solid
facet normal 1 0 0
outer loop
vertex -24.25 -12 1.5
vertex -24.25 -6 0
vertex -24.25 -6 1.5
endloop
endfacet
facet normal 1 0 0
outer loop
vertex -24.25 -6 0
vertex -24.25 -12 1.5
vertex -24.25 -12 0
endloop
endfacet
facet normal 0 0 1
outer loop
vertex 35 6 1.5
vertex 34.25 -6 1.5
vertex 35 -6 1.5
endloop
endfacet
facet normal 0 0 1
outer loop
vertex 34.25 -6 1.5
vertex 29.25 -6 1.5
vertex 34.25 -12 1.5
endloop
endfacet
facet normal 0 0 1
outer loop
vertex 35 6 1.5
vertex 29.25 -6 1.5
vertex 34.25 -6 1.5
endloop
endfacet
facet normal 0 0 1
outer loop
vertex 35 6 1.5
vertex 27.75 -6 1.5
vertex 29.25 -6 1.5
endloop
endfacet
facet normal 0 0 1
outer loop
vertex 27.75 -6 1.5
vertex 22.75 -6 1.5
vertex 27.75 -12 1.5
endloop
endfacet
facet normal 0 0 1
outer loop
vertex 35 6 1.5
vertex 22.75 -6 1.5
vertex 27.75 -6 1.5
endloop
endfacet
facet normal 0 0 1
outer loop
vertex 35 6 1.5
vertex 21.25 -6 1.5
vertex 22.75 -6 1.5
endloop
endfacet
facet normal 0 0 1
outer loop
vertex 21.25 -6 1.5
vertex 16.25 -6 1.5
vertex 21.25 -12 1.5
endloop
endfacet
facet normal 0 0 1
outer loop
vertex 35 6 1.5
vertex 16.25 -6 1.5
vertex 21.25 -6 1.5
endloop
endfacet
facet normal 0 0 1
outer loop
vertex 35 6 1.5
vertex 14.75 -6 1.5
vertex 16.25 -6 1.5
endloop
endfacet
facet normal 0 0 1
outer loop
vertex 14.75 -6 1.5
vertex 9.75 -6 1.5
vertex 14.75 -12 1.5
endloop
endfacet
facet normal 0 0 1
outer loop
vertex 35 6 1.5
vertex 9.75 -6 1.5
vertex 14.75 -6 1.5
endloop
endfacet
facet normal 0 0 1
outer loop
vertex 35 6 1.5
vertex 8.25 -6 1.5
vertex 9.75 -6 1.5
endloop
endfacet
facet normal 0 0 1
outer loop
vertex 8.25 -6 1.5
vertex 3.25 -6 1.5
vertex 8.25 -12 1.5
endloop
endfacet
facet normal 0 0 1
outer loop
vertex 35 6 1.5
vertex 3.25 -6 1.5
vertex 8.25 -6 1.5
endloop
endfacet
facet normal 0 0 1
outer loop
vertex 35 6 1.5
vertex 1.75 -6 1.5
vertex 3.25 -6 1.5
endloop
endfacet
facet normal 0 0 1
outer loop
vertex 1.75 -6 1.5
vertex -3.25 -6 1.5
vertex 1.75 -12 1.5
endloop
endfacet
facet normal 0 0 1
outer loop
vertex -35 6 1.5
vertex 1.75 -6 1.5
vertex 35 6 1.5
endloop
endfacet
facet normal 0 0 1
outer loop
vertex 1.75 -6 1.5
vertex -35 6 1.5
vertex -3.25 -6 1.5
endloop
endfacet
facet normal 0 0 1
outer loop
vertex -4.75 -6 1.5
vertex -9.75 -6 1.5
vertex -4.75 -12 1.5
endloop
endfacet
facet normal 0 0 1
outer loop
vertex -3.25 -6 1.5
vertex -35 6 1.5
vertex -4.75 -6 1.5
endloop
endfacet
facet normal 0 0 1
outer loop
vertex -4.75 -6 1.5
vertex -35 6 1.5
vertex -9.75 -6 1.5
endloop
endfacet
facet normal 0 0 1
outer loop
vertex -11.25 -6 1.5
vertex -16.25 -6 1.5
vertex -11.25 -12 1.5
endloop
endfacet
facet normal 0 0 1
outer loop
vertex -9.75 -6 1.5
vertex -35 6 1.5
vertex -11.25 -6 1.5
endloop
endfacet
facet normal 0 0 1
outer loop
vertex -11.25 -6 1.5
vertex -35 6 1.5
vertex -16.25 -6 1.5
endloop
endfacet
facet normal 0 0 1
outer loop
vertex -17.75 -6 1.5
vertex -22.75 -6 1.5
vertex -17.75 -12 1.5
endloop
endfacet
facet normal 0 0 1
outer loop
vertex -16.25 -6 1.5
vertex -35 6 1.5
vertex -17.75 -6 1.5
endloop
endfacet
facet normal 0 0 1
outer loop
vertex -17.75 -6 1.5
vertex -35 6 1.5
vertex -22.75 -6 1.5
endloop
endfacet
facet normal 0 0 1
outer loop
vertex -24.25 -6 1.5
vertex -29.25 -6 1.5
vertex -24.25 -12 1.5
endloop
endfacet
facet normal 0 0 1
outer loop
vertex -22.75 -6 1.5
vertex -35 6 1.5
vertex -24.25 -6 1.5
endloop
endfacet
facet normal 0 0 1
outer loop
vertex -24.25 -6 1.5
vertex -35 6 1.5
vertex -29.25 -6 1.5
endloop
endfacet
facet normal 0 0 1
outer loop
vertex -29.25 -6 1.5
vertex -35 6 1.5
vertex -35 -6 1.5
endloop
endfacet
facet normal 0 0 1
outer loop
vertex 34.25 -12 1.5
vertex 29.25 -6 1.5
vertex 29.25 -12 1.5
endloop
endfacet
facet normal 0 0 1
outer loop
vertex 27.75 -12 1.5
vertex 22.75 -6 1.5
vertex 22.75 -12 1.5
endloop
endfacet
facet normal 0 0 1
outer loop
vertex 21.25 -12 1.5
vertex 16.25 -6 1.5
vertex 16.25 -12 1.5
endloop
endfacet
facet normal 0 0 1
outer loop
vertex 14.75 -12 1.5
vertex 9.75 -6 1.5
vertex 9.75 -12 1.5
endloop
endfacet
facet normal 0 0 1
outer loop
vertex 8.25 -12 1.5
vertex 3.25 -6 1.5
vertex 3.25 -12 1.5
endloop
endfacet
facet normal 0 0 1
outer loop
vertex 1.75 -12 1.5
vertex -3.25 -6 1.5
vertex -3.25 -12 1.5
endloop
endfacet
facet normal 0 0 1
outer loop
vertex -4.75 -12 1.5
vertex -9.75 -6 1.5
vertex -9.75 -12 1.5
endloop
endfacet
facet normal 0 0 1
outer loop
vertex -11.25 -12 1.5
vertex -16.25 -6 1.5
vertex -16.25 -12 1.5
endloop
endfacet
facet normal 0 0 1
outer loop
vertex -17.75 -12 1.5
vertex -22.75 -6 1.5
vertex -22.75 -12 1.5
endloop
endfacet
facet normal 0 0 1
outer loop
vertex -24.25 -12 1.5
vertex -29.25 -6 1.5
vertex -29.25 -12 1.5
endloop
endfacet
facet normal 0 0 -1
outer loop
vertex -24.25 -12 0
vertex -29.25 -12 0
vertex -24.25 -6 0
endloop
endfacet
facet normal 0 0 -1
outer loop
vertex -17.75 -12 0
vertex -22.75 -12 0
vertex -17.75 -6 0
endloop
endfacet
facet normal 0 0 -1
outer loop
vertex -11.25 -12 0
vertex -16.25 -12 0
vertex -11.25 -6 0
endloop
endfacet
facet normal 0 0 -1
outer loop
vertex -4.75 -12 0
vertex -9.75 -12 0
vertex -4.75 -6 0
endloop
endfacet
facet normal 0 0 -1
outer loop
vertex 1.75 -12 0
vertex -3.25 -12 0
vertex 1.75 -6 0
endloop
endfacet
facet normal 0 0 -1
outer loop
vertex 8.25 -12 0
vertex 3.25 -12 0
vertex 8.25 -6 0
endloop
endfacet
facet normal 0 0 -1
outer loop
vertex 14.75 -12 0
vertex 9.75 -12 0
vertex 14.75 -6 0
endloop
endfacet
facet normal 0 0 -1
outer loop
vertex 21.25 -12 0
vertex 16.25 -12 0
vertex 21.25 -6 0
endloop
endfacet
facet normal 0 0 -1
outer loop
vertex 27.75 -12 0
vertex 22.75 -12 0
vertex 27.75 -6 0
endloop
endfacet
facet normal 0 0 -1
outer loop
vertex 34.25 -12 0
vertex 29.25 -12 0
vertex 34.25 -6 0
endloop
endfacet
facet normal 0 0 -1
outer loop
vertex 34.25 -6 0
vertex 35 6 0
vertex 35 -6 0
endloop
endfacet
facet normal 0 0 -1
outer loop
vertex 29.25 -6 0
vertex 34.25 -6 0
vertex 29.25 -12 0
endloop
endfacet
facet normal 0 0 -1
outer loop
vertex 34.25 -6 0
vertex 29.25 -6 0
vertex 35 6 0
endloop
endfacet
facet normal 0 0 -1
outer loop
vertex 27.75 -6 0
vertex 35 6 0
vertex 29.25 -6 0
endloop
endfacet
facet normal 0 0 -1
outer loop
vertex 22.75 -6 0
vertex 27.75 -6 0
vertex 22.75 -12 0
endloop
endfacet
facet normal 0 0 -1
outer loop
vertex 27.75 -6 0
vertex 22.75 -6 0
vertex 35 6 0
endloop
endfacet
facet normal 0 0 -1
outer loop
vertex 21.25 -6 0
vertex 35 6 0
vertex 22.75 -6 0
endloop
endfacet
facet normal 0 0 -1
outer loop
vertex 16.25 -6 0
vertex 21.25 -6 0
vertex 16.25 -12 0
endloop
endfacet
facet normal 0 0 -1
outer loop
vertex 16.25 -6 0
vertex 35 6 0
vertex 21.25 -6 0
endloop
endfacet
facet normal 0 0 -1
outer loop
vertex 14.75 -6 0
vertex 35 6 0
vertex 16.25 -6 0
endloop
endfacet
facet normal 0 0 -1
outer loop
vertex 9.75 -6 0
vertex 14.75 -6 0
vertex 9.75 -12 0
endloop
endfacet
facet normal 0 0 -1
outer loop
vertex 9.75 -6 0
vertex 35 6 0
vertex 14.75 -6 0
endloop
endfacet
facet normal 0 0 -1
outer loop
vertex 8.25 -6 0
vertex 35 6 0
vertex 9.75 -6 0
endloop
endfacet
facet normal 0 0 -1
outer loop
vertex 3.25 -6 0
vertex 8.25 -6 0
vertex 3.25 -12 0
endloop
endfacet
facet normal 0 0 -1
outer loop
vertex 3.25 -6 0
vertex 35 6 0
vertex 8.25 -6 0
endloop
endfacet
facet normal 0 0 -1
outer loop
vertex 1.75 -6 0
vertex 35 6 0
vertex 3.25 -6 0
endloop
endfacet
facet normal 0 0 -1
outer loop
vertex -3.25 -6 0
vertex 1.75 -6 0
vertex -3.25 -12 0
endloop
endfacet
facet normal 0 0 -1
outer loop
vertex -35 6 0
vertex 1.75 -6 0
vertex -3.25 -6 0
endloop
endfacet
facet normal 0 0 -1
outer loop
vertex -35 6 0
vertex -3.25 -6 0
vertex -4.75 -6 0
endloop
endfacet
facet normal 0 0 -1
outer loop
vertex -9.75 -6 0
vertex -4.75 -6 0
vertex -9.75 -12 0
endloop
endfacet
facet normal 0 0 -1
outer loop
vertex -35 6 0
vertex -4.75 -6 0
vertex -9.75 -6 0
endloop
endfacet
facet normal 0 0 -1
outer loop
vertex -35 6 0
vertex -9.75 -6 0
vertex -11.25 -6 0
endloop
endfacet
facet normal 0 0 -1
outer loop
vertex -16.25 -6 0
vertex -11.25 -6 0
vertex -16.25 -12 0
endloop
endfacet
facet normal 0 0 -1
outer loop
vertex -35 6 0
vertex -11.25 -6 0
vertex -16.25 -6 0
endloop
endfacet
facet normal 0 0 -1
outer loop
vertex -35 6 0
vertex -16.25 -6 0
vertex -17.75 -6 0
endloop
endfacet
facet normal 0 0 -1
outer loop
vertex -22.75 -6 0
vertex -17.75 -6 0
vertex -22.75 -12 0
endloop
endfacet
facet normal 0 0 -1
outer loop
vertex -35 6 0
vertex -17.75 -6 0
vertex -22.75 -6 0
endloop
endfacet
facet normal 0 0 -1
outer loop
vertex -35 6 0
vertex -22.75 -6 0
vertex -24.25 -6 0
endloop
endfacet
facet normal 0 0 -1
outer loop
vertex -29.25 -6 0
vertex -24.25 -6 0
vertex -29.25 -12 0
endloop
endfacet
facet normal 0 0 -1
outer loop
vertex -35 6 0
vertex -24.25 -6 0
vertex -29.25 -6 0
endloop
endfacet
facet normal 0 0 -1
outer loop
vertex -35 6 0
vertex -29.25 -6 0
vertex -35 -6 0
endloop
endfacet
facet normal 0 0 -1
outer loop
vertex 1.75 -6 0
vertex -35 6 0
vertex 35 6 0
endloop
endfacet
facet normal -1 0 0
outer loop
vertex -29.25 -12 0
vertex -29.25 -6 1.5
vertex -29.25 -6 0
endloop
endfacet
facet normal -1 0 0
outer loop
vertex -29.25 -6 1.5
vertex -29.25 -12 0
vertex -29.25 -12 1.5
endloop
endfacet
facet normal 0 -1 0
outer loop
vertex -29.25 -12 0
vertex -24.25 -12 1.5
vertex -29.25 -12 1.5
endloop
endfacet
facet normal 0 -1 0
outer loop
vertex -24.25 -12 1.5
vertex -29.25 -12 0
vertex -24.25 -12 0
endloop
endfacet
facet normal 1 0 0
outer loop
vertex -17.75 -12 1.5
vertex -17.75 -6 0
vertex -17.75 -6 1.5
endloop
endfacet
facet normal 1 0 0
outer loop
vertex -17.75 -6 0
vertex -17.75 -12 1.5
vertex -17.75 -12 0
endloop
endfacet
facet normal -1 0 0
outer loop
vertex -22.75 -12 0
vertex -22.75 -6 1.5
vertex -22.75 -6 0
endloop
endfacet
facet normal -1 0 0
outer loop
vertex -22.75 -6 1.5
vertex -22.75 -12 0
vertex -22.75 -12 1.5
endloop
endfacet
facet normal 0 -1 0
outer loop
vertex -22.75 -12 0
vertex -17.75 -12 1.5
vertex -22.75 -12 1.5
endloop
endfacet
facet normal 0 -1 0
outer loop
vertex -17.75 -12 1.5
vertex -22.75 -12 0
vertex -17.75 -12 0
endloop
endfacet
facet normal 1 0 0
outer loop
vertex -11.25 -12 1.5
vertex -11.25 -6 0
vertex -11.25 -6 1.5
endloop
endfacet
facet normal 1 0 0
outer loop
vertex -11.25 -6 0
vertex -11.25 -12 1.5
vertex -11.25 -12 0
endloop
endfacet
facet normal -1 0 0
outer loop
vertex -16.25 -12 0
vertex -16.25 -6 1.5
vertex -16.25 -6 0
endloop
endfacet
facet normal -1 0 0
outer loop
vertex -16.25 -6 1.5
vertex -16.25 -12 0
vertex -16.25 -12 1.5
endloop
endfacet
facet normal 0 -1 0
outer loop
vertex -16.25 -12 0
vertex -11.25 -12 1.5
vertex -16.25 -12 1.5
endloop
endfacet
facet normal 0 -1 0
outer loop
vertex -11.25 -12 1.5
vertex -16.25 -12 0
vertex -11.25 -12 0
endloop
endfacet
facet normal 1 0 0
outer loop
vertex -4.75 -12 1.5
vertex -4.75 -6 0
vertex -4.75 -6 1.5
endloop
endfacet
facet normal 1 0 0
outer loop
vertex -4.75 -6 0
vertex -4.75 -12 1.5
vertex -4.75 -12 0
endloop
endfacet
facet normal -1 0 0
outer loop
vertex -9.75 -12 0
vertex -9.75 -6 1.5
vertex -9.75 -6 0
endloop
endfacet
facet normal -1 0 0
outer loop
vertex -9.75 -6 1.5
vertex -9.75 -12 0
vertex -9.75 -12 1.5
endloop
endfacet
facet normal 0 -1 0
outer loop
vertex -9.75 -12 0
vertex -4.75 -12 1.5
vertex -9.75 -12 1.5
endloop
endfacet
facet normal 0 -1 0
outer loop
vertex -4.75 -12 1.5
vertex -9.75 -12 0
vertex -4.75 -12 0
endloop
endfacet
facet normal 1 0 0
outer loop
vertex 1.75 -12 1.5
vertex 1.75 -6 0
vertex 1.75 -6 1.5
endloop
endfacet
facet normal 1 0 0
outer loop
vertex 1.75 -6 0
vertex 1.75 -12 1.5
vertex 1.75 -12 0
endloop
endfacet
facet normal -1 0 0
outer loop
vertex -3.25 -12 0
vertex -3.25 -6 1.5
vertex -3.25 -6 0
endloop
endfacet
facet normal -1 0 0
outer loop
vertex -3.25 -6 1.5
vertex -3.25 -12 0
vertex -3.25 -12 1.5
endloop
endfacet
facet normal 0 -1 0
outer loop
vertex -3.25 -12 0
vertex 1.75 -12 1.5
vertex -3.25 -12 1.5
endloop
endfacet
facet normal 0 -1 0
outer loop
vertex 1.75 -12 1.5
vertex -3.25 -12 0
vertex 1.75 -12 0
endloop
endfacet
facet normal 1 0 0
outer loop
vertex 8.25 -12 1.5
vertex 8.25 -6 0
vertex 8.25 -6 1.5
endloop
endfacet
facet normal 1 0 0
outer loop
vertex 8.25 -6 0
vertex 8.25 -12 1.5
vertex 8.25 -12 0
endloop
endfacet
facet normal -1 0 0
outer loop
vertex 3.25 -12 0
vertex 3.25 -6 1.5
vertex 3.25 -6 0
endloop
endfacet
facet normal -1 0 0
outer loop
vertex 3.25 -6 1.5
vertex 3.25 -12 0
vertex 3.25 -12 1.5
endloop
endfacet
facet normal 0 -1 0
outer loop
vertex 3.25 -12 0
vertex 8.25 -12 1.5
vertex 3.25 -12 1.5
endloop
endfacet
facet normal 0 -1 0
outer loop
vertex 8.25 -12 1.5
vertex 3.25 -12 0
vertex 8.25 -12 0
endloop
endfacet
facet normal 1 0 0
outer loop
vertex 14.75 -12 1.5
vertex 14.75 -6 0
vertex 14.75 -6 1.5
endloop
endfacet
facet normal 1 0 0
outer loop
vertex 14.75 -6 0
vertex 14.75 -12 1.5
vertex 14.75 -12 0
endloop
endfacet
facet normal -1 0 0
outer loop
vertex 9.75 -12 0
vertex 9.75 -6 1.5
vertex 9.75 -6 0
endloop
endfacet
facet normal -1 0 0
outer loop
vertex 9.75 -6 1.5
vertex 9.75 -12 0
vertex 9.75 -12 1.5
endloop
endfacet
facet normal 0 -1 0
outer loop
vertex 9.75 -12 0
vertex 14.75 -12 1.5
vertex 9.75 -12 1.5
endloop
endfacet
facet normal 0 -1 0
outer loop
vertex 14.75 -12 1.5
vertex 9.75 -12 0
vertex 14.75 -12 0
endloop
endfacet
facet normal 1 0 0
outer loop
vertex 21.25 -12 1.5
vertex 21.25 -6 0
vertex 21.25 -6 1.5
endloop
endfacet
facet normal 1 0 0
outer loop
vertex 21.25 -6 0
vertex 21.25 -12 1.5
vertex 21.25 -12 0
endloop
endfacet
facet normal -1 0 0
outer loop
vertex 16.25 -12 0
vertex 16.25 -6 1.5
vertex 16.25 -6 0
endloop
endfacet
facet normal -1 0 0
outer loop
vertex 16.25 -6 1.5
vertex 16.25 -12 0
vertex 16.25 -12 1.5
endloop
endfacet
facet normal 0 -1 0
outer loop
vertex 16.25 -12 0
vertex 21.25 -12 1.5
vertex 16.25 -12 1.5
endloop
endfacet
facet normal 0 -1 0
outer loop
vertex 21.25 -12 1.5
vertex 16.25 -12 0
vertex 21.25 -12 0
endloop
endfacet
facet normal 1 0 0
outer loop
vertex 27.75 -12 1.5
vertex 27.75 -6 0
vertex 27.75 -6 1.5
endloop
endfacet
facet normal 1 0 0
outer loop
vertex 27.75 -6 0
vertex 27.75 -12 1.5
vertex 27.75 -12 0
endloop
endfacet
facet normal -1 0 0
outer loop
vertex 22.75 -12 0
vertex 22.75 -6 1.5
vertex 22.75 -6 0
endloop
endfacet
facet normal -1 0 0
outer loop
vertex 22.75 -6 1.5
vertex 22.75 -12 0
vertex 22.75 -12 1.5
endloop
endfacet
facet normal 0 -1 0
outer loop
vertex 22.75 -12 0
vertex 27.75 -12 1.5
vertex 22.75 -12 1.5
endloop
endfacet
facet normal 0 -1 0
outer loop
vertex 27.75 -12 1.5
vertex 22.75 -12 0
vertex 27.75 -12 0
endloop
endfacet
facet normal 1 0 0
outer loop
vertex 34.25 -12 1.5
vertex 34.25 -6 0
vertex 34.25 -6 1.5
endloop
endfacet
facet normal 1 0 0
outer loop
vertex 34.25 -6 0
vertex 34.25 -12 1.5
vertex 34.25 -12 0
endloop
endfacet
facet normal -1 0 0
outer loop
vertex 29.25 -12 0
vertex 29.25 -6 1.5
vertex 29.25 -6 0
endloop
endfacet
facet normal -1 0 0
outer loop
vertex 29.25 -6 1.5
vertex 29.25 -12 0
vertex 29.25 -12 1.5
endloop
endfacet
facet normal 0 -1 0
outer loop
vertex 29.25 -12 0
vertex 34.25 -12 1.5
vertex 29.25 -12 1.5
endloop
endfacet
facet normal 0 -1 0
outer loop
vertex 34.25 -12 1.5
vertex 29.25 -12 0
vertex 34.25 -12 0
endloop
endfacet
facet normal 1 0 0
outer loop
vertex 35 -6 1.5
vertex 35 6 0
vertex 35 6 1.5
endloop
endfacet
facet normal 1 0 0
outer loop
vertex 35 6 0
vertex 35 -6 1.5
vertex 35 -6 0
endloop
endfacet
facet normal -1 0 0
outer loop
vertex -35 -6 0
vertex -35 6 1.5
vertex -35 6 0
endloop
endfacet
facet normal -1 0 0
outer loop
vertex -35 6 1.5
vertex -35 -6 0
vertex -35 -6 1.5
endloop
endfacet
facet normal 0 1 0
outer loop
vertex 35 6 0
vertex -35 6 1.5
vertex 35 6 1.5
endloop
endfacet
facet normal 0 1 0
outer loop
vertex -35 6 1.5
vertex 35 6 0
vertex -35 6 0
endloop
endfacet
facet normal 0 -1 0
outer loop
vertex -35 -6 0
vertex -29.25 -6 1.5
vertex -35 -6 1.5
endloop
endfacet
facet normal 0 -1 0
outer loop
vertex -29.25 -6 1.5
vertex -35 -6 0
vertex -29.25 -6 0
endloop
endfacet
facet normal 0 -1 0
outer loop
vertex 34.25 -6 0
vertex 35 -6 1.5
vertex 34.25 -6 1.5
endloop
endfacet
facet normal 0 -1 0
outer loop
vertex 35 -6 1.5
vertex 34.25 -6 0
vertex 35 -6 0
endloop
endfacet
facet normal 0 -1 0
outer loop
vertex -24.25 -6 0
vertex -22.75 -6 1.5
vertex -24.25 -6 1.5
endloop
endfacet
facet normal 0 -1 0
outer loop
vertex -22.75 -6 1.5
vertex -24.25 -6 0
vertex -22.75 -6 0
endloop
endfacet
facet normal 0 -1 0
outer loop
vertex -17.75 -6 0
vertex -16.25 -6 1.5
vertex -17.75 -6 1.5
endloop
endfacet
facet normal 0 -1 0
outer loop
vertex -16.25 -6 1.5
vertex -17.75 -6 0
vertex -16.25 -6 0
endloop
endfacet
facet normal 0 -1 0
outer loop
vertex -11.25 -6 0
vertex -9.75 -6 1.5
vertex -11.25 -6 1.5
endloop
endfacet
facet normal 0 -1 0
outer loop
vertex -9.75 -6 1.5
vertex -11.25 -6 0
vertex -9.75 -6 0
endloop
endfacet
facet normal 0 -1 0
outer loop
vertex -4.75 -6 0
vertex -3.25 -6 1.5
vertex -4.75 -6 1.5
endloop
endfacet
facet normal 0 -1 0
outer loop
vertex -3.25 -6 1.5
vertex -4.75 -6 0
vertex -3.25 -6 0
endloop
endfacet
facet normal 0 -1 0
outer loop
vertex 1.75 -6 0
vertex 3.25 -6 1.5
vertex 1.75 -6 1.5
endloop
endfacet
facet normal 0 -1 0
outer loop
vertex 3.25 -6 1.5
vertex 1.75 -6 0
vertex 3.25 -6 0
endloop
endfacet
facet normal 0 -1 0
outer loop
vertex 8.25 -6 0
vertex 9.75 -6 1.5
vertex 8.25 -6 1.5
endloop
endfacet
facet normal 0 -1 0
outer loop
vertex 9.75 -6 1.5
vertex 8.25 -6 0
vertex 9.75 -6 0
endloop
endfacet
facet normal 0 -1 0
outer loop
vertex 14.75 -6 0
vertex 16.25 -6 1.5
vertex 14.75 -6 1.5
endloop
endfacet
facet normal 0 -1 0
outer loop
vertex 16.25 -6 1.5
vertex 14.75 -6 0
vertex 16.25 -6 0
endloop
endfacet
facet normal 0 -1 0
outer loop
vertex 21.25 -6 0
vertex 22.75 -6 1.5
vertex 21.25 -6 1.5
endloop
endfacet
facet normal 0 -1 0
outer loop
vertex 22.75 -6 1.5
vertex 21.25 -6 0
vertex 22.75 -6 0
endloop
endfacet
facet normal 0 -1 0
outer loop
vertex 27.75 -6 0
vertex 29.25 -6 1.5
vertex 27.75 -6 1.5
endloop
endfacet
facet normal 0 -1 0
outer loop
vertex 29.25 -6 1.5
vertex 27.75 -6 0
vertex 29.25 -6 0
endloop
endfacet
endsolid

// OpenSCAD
// 10-well comb for casting agarose gels
// Print orientation: flat on bed, teeth pointing down (-Y)

// ---- Dimensions (mm) ----
plate_t      = 1.5;   // plate thickness (Z)
spine_l      = 70;    // spine length (X)
spine_w      = 12;    // spine width (Y)
tooth_w      = 5.0;   // tooth width (X)
tooth_l      = 12;    // tooth length (Y)
tooth_count  = 10;    // number of teeth
tooth_gap    = 1.5;   // gap between neighbouring teeth (X)
overhang     = 0.5;   // extra length so teeth pass through the plate

// ---- Derived ----
pitch   = tooth_w + tooth_gap;            // centre-to-centre spacing
x_start = -(tooth_count - 1) * pitch / 2; // first tooth centre (row centred)

// ---- Model ----
union() {
    // Spine (back bar)
    translate([-spine_l / 2, -spine_w / 2, 0])
        cube([spine_l, spine_w, plate_t]);

    // Teeth
    for (i = [0 : tooth_count - 1])
        translate([x_start + i * pitch, -tooth_l, 0])
            cube([tooth_w, tooth_l + overhang, plate_t]);
}
